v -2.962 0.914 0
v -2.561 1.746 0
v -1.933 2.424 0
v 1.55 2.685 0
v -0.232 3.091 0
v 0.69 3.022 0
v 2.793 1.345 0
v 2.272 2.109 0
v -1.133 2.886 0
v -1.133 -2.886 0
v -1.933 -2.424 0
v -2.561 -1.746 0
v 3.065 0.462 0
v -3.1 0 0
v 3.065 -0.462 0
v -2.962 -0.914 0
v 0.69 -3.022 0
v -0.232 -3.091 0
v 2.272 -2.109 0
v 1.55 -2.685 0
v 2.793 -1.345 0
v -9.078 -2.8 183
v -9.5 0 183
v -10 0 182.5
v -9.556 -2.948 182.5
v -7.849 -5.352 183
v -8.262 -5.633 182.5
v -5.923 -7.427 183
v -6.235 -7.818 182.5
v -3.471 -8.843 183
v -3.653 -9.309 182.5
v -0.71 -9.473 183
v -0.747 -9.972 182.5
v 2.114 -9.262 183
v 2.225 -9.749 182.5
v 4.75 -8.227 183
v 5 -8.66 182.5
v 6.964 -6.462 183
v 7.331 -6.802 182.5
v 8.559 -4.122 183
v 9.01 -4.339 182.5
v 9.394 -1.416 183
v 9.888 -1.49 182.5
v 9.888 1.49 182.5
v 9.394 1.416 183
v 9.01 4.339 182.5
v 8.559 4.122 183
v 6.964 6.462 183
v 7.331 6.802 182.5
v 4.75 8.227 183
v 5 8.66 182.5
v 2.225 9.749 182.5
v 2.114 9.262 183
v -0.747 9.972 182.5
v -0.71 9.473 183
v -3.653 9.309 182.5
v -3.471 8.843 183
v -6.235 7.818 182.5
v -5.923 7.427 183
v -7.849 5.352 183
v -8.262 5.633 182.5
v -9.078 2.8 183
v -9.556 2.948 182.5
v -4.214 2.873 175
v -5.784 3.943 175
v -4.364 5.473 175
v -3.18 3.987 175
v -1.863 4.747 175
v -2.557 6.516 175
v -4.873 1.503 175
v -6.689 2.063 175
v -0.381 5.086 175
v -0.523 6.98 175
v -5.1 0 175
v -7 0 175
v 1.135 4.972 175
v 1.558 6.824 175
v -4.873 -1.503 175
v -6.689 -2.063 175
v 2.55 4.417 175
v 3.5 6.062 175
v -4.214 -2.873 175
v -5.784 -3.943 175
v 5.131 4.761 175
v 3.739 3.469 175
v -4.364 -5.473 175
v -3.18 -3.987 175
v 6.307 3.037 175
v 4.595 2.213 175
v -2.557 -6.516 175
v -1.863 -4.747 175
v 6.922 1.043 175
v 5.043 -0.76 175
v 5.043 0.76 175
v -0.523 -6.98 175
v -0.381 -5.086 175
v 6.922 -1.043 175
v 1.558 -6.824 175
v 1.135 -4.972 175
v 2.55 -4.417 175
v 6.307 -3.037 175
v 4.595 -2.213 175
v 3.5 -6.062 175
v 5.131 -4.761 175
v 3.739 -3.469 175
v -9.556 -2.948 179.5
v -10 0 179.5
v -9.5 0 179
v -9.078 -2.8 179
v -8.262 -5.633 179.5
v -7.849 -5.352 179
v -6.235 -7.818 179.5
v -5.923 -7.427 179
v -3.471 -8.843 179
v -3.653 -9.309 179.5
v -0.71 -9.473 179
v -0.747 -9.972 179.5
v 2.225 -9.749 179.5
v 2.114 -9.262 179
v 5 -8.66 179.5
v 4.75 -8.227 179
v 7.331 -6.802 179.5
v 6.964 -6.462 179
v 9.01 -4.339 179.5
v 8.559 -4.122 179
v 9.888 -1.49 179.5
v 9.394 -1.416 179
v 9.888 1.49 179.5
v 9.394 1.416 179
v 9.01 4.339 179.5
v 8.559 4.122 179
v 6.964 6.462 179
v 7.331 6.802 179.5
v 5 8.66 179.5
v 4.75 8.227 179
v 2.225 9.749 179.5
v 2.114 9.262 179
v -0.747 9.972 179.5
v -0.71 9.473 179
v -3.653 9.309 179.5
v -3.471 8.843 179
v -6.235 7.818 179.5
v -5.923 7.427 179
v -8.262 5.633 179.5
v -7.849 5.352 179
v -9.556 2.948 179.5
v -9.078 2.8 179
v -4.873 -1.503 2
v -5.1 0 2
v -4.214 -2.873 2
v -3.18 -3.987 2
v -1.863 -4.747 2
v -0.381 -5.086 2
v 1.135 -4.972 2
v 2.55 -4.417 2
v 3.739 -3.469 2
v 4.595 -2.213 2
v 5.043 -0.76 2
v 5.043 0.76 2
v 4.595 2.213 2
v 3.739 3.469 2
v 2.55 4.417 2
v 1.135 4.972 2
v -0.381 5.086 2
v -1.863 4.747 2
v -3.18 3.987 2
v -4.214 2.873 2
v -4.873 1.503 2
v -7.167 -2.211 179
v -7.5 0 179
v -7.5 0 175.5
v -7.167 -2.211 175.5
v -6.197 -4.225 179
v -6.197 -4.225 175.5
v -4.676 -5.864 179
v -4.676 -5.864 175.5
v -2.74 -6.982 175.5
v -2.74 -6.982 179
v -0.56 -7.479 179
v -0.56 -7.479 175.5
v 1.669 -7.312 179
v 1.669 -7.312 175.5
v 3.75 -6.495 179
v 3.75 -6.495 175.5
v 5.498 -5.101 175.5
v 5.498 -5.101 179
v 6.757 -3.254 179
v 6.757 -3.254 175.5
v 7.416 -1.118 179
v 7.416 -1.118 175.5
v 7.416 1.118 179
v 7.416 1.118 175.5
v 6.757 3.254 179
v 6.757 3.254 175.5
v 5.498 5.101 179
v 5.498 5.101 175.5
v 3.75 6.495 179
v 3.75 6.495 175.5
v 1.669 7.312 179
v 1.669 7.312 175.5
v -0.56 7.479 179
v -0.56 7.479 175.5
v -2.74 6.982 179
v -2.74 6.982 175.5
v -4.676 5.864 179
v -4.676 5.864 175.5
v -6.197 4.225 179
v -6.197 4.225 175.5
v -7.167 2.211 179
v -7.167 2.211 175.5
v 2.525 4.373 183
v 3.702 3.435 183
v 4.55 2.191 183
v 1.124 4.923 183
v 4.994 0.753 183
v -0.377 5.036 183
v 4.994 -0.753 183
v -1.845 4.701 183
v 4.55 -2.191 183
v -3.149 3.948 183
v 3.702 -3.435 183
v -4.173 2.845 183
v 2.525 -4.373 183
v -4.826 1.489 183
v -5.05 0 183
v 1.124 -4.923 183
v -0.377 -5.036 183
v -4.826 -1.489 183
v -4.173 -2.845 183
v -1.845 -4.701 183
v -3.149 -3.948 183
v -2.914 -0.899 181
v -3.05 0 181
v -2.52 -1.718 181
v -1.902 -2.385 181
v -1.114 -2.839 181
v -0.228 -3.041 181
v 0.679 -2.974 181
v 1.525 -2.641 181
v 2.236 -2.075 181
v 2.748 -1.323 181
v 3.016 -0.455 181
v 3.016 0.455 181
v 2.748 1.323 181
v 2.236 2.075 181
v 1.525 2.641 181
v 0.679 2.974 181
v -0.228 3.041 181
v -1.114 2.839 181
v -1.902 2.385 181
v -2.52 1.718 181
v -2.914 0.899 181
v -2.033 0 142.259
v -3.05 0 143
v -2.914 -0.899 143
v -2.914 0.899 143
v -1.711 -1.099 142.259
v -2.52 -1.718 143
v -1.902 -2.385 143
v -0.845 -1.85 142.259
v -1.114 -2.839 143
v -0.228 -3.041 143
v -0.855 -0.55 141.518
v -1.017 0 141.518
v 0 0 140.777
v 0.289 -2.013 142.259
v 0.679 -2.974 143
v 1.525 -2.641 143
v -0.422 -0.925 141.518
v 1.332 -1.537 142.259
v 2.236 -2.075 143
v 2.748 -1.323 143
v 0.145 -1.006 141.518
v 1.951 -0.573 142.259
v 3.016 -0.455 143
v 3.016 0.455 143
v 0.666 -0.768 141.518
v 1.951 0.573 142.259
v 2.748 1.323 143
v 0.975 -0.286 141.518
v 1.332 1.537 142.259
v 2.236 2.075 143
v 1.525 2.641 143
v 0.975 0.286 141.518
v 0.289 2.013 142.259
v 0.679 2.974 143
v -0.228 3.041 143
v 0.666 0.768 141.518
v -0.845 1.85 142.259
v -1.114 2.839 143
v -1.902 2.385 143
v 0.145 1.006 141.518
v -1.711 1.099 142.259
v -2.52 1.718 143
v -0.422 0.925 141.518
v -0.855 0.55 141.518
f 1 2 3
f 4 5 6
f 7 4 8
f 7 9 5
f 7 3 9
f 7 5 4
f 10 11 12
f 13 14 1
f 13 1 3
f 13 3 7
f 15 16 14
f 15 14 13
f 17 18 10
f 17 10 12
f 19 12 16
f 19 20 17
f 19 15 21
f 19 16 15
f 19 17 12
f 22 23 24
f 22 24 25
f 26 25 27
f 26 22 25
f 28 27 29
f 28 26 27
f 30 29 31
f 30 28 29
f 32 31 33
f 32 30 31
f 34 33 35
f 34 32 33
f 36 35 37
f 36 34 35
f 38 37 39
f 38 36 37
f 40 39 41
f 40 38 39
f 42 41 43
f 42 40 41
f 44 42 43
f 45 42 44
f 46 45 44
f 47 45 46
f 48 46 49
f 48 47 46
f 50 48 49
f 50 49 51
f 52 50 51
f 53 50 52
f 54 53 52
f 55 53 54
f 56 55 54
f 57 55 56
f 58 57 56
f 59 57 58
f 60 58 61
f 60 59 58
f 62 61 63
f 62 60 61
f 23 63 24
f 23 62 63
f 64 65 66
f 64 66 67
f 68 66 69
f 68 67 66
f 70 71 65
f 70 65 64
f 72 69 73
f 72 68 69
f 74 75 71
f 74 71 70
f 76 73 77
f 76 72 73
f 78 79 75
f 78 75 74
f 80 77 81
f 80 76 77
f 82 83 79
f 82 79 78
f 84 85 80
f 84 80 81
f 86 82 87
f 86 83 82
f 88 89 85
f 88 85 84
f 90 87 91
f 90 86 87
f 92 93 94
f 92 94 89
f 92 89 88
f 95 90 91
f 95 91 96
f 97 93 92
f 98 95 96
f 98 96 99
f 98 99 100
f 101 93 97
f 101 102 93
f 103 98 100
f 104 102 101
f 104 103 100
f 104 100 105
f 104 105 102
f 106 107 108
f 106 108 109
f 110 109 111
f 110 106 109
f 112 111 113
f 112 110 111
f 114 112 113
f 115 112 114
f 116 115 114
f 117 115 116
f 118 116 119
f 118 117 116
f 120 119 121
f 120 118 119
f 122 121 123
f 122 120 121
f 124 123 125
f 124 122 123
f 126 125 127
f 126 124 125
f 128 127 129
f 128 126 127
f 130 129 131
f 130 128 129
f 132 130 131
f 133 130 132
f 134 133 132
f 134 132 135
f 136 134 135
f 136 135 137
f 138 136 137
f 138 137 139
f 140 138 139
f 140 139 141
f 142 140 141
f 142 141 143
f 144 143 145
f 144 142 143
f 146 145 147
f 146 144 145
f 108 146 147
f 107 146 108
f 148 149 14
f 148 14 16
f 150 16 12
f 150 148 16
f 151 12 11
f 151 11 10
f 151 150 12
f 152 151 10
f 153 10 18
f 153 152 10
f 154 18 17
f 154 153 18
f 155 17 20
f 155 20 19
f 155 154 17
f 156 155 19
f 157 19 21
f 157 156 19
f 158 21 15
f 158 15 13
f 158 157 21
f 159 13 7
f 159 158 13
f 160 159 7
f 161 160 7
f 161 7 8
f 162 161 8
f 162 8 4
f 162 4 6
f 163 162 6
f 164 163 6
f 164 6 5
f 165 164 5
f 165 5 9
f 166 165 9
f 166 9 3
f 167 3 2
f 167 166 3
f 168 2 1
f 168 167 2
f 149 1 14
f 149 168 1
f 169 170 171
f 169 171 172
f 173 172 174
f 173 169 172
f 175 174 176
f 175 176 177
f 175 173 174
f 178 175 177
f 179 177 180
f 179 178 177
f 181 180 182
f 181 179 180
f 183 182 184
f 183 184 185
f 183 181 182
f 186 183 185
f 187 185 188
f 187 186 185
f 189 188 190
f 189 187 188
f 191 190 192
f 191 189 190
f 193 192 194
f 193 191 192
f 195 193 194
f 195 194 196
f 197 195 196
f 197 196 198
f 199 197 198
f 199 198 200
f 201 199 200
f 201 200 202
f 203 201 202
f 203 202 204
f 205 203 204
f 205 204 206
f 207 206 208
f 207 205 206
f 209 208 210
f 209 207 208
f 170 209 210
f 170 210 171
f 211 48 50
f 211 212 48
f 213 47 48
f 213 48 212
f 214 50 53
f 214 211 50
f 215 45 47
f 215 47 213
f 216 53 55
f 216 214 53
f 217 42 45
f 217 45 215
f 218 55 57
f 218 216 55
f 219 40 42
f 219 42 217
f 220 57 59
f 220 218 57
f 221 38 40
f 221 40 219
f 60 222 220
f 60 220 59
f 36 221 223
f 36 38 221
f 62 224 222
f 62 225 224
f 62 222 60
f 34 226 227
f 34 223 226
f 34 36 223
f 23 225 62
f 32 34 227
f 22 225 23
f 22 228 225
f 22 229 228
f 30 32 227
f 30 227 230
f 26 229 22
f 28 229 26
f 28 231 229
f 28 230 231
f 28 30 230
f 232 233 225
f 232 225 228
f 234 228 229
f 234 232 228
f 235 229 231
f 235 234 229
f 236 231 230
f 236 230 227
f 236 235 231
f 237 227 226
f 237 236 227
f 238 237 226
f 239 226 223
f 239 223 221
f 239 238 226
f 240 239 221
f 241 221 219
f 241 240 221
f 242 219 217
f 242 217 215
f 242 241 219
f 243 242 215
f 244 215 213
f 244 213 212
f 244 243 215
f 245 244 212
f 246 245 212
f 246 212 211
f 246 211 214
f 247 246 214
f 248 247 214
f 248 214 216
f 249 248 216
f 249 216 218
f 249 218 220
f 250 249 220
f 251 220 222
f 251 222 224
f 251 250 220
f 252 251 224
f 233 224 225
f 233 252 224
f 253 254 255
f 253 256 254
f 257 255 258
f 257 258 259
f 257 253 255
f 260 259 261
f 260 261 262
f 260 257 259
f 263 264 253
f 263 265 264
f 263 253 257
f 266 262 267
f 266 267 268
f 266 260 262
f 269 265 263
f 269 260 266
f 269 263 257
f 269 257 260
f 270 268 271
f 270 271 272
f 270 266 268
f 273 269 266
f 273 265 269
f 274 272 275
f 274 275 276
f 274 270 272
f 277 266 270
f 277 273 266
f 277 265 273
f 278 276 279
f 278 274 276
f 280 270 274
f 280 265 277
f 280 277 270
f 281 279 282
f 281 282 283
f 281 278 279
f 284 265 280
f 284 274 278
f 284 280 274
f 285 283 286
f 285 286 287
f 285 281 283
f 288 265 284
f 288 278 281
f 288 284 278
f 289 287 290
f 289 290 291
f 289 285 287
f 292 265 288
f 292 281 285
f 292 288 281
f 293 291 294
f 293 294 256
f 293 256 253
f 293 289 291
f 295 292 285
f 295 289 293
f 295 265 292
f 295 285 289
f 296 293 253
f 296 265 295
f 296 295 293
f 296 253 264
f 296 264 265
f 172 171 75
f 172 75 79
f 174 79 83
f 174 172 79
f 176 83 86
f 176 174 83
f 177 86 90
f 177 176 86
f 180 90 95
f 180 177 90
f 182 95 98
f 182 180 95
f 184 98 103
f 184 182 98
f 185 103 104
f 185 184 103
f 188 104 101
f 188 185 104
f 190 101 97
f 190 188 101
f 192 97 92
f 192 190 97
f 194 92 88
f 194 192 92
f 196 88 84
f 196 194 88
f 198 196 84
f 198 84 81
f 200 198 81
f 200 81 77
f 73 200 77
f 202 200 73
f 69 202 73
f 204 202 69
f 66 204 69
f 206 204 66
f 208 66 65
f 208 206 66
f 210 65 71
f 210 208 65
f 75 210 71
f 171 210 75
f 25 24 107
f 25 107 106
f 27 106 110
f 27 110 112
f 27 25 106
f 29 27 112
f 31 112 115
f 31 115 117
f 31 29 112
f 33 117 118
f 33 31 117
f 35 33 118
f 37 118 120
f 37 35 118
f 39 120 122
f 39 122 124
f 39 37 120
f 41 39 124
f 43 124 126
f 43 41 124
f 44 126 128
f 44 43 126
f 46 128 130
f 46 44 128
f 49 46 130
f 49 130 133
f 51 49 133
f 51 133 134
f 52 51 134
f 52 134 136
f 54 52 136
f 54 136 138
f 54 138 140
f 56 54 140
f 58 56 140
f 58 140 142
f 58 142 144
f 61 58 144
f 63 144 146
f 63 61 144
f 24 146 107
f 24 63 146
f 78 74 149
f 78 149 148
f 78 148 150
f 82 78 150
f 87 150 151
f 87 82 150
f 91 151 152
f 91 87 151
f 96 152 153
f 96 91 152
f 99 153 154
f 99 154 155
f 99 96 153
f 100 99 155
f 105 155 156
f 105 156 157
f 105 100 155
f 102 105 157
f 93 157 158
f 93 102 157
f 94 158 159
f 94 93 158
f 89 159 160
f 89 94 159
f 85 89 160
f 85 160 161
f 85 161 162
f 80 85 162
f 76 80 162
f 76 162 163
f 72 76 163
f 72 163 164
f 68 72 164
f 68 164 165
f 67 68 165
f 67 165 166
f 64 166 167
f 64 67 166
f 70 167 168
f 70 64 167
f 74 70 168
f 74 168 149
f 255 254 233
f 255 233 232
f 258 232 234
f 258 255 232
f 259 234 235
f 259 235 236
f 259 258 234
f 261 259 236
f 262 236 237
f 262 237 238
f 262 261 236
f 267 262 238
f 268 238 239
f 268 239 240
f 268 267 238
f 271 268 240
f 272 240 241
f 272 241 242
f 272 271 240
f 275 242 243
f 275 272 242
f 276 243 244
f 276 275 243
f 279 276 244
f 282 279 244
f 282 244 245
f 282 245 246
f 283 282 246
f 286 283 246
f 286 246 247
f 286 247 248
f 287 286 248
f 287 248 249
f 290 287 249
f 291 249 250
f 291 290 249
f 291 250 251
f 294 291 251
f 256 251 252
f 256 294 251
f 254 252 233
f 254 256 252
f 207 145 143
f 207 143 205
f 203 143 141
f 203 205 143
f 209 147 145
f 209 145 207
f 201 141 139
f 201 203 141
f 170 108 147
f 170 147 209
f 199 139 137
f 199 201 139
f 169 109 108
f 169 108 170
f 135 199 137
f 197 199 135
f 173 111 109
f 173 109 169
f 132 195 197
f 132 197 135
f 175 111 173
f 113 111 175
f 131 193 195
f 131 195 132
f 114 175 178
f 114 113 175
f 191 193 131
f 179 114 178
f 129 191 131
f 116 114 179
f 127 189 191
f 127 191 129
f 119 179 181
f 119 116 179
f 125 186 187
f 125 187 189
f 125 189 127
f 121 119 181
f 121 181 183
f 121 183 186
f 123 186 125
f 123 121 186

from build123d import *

# Parameters (mm, degrees)
CHAMFER_1_SIZE = 2
CHAMFER_2_SIZE = 0.5


with BuildPart() as part:
    # Эскиз1 → Повернуть1 (revolve)
    with BuildSketch(Plane(origin=(0, 0, 0), x_dir=(0, 0, -1), z_dir=(1, 0, 0)), mode=Mode.PRIVATE) as revolve_1_sk:
        Polygon((0, 0), (0, 5.1), (-175, 5.1), (-175, 7.5), (-179, 7.5), (-179, 10), (-183, 10), (-183, 3.05), (-143, 3.05), (-140.777028701, 0), align=None)
    revolve(revolve_1_sk.sketch.rotate(Axis((0, 0, 0), (0, 0, 1)), 90), axis=Axis((0, 0, 0), (0, 0, 1)))  # turned: the seam where the file's is

    # Фаска1
    chamfer_1_edges = [part.edges().sort_by_distance(p)[0] for p in [
        (5.1, 0, 0),
        (3.05, 0, 183),
    ]]
    chamfer(chamfer_1_edges, length=CHAMFER_1_SIZE)

    # Фаска2
    chamfer_2_edges = [part.edges().sort_by_distance(p)[0] for p in [
        (10, 0, 183),
        (10, 0, 179),
        (7.5, 0, 175),
    ]]
    chamfer(chamfer_2_edges, length=CHAMFER_2_SIZE)


solid = part.part
